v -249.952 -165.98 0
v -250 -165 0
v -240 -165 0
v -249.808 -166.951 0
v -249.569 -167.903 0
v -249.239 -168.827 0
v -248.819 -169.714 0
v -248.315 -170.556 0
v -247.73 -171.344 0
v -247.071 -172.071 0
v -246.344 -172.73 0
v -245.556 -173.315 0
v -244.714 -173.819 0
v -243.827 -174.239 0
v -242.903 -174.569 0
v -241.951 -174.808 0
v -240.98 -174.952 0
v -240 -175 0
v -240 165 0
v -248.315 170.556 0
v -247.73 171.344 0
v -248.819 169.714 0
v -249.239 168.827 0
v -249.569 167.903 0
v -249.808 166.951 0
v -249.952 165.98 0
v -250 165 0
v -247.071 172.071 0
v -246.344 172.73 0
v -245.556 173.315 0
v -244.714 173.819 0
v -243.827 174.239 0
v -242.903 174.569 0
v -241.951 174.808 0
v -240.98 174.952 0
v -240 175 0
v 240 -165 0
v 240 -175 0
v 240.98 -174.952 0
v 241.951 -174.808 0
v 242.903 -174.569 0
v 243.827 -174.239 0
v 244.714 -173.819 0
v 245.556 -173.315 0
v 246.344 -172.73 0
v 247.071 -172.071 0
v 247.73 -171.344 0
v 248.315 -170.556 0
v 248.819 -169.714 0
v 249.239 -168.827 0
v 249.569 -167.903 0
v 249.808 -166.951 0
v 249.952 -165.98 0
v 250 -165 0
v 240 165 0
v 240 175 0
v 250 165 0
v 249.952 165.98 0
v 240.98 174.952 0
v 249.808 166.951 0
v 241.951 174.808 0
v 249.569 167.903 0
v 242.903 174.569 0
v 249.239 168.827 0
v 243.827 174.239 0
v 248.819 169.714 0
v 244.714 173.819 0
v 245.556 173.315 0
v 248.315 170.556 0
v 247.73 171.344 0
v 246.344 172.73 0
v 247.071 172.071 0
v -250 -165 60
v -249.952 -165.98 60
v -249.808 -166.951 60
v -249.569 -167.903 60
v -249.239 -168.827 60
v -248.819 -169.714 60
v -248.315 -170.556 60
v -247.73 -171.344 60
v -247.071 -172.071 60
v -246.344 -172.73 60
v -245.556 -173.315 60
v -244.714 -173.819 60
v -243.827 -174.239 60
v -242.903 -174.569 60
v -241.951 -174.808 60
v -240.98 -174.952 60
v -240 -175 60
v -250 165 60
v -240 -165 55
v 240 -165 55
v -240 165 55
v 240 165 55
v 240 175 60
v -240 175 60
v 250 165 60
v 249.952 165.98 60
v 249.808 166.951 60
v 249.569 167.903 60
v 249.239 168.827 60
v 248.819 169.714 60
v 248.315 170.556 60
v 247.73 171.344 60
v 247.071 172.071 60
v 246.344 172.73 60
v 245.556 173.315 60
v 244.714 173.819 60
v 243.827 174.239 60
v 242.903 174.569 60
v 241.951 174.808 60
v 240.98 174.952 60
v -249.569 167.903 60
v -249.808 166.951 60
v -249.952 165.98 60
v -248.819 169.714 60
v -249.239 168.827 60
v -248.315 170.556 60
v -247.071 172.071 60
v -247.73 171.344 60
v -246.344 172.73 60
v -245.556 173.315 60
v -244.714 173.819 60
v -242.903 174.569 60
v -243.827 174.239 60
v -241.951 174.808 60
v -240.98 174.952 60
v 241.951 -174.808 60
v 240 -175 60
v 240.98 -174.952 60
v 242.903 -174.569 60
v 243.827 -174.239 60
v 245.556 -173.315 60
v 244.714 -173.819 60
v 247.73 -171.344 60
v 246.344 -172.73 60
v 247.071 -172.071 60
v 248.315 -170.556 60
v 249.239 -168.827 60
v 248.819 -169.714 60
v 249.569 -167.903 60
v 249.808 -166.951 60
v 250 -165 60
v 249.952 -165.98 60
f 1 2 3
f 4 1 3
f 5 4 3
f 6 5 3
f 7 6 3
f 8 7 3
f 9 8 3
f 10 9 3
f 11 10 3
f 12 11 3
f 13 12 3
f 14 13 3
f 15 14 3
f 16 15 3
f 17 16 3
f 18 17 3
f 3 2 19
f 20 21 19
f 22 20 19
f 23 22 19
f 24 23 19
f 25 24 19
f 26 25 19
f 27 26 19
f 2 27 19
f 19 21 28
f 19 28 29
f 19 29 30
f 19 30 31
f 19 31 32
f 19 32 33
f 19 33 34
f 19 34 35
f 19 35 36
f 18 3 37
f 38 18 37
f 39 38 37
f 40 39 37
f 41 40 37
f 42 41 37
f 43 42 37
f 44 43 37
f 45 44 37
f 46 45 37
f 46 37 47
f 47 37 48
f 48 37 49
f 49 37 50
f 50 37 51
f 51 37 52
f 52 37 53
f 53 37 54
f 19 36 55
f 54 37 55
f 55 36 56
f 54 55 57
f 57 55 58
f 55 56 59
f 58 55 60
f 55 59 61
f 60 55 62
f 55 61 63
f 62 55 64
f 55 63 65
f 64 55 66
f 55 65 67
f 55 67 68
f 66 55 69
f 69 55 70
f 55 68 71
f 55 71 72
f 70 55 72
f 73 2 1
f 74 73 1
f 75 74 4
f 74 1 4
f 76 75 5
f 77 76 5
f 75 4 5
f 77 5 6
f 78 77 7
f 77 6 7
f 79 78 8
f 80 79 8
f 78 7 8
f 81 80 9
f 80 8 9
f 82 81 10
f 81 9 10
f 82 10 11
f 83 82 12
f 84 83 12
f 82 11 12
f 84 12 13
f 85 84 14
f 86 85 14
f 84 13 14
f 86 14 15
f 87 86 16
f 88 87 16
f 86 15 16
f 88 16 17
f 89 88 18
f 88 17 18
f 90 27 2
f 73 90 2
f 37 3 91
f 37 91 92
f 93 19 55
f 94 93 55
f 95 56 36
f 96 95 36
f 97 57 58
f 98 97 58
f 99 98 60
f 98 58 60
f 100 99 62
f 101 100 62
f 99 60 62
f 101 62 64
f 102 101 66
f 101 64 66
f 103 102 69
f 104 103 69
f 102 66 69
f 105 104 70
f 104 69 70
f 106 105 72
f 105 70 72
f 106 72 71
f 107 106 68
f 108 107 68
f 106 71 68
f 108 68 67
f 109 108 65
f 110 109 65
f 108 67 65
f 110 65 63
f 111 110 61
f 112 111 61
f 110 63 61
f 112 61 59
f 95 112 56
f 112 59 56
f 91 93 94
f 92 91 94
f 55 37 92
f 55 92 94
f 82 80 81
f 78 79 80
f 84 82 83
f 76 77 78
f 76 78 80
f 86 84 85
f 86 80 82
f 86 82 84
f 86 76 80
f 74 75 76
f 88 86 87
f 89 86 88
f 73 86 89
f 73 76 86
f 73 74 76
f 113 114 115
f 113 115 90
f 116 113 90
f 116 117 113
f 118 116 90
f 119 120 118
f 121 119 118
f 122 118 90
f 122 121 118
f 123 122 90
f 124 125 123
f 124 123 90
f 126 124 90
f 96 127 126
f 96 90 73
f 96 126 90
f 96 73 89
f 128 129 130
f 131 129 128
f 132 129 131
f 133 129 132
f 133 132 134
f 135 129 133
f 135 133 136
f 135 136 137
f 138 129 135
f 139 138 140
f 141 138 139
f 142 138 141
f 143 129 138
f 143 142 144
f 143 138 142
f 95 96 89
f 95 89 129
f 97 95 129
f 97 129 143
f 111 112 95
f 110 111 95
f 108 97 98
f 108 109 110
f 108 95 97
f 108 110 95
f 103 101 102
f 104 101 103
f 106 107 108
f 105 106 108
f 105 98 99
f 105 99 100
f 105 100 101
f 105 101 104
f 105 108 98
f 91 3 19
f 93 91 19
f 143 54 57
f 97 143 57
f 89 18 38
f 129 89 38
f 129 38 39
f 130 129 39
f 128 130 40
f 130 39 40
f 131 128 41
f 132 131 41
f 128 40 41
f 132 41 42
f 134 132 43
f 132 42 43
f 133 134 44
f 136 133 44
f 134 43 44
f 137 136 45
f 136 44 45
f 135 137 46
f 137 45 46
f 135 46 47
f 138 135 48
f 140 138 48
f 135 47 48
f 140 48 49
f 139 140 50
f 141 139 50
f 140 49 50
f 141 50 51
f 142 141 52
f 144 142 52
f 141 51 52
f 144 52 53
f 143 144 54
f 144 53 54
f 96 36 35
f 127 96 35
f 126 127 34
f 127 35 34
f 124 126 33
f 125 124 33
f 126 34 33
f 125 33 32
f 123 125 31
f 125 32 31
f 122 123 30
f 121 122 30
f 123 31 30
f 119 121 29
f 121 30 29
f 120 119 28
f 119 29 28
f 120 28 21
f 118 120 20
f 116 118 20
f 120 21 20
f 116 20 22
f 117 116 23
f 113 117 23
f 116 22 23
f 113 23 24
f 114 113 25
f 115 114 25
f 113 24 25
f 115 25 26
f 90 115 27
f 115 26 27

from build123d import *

# Parameters (mm, degrees)
F1_DEPTH = 60
F2_W     = 480.000014
F2_H     = 330.000014
F3_DEPTH = 55


with BuildPart() as f1:
    # F0 (on Top) → F1 (new body)
    with BuildSketch(Plane.XY):
        with BuildLine():
            ThreePointArc((250, 165), (247.071068, 172.071068), (240, 175))
            Line((240, 175), (-240, 175))
            ThreePointArc((-240, 175), (-247.071068, 172.071068), (-250, 165))
            Line((-250, 165), (-250, -165))
            ThreePointArc((-250, -165), (-247.071068, -172.071068), (-240, -175))
            Line((-240, -175), (240, -175))
            ThreePointArc((240, -175), (247.071068, -172.071068), (250, -165))
            Line((250, -165), (250, 165))
        make_face()
    extrude(amount=F1_DEPTH)

    # F2 (on face) → F3 (cut)
    with BuildSketch(Plane.XY):
        Rectangle(F2_W, F2_H)
    extrude(amount=F3_DEPTH, mode=Mode.SUBTRACT)


solid = f1.part
